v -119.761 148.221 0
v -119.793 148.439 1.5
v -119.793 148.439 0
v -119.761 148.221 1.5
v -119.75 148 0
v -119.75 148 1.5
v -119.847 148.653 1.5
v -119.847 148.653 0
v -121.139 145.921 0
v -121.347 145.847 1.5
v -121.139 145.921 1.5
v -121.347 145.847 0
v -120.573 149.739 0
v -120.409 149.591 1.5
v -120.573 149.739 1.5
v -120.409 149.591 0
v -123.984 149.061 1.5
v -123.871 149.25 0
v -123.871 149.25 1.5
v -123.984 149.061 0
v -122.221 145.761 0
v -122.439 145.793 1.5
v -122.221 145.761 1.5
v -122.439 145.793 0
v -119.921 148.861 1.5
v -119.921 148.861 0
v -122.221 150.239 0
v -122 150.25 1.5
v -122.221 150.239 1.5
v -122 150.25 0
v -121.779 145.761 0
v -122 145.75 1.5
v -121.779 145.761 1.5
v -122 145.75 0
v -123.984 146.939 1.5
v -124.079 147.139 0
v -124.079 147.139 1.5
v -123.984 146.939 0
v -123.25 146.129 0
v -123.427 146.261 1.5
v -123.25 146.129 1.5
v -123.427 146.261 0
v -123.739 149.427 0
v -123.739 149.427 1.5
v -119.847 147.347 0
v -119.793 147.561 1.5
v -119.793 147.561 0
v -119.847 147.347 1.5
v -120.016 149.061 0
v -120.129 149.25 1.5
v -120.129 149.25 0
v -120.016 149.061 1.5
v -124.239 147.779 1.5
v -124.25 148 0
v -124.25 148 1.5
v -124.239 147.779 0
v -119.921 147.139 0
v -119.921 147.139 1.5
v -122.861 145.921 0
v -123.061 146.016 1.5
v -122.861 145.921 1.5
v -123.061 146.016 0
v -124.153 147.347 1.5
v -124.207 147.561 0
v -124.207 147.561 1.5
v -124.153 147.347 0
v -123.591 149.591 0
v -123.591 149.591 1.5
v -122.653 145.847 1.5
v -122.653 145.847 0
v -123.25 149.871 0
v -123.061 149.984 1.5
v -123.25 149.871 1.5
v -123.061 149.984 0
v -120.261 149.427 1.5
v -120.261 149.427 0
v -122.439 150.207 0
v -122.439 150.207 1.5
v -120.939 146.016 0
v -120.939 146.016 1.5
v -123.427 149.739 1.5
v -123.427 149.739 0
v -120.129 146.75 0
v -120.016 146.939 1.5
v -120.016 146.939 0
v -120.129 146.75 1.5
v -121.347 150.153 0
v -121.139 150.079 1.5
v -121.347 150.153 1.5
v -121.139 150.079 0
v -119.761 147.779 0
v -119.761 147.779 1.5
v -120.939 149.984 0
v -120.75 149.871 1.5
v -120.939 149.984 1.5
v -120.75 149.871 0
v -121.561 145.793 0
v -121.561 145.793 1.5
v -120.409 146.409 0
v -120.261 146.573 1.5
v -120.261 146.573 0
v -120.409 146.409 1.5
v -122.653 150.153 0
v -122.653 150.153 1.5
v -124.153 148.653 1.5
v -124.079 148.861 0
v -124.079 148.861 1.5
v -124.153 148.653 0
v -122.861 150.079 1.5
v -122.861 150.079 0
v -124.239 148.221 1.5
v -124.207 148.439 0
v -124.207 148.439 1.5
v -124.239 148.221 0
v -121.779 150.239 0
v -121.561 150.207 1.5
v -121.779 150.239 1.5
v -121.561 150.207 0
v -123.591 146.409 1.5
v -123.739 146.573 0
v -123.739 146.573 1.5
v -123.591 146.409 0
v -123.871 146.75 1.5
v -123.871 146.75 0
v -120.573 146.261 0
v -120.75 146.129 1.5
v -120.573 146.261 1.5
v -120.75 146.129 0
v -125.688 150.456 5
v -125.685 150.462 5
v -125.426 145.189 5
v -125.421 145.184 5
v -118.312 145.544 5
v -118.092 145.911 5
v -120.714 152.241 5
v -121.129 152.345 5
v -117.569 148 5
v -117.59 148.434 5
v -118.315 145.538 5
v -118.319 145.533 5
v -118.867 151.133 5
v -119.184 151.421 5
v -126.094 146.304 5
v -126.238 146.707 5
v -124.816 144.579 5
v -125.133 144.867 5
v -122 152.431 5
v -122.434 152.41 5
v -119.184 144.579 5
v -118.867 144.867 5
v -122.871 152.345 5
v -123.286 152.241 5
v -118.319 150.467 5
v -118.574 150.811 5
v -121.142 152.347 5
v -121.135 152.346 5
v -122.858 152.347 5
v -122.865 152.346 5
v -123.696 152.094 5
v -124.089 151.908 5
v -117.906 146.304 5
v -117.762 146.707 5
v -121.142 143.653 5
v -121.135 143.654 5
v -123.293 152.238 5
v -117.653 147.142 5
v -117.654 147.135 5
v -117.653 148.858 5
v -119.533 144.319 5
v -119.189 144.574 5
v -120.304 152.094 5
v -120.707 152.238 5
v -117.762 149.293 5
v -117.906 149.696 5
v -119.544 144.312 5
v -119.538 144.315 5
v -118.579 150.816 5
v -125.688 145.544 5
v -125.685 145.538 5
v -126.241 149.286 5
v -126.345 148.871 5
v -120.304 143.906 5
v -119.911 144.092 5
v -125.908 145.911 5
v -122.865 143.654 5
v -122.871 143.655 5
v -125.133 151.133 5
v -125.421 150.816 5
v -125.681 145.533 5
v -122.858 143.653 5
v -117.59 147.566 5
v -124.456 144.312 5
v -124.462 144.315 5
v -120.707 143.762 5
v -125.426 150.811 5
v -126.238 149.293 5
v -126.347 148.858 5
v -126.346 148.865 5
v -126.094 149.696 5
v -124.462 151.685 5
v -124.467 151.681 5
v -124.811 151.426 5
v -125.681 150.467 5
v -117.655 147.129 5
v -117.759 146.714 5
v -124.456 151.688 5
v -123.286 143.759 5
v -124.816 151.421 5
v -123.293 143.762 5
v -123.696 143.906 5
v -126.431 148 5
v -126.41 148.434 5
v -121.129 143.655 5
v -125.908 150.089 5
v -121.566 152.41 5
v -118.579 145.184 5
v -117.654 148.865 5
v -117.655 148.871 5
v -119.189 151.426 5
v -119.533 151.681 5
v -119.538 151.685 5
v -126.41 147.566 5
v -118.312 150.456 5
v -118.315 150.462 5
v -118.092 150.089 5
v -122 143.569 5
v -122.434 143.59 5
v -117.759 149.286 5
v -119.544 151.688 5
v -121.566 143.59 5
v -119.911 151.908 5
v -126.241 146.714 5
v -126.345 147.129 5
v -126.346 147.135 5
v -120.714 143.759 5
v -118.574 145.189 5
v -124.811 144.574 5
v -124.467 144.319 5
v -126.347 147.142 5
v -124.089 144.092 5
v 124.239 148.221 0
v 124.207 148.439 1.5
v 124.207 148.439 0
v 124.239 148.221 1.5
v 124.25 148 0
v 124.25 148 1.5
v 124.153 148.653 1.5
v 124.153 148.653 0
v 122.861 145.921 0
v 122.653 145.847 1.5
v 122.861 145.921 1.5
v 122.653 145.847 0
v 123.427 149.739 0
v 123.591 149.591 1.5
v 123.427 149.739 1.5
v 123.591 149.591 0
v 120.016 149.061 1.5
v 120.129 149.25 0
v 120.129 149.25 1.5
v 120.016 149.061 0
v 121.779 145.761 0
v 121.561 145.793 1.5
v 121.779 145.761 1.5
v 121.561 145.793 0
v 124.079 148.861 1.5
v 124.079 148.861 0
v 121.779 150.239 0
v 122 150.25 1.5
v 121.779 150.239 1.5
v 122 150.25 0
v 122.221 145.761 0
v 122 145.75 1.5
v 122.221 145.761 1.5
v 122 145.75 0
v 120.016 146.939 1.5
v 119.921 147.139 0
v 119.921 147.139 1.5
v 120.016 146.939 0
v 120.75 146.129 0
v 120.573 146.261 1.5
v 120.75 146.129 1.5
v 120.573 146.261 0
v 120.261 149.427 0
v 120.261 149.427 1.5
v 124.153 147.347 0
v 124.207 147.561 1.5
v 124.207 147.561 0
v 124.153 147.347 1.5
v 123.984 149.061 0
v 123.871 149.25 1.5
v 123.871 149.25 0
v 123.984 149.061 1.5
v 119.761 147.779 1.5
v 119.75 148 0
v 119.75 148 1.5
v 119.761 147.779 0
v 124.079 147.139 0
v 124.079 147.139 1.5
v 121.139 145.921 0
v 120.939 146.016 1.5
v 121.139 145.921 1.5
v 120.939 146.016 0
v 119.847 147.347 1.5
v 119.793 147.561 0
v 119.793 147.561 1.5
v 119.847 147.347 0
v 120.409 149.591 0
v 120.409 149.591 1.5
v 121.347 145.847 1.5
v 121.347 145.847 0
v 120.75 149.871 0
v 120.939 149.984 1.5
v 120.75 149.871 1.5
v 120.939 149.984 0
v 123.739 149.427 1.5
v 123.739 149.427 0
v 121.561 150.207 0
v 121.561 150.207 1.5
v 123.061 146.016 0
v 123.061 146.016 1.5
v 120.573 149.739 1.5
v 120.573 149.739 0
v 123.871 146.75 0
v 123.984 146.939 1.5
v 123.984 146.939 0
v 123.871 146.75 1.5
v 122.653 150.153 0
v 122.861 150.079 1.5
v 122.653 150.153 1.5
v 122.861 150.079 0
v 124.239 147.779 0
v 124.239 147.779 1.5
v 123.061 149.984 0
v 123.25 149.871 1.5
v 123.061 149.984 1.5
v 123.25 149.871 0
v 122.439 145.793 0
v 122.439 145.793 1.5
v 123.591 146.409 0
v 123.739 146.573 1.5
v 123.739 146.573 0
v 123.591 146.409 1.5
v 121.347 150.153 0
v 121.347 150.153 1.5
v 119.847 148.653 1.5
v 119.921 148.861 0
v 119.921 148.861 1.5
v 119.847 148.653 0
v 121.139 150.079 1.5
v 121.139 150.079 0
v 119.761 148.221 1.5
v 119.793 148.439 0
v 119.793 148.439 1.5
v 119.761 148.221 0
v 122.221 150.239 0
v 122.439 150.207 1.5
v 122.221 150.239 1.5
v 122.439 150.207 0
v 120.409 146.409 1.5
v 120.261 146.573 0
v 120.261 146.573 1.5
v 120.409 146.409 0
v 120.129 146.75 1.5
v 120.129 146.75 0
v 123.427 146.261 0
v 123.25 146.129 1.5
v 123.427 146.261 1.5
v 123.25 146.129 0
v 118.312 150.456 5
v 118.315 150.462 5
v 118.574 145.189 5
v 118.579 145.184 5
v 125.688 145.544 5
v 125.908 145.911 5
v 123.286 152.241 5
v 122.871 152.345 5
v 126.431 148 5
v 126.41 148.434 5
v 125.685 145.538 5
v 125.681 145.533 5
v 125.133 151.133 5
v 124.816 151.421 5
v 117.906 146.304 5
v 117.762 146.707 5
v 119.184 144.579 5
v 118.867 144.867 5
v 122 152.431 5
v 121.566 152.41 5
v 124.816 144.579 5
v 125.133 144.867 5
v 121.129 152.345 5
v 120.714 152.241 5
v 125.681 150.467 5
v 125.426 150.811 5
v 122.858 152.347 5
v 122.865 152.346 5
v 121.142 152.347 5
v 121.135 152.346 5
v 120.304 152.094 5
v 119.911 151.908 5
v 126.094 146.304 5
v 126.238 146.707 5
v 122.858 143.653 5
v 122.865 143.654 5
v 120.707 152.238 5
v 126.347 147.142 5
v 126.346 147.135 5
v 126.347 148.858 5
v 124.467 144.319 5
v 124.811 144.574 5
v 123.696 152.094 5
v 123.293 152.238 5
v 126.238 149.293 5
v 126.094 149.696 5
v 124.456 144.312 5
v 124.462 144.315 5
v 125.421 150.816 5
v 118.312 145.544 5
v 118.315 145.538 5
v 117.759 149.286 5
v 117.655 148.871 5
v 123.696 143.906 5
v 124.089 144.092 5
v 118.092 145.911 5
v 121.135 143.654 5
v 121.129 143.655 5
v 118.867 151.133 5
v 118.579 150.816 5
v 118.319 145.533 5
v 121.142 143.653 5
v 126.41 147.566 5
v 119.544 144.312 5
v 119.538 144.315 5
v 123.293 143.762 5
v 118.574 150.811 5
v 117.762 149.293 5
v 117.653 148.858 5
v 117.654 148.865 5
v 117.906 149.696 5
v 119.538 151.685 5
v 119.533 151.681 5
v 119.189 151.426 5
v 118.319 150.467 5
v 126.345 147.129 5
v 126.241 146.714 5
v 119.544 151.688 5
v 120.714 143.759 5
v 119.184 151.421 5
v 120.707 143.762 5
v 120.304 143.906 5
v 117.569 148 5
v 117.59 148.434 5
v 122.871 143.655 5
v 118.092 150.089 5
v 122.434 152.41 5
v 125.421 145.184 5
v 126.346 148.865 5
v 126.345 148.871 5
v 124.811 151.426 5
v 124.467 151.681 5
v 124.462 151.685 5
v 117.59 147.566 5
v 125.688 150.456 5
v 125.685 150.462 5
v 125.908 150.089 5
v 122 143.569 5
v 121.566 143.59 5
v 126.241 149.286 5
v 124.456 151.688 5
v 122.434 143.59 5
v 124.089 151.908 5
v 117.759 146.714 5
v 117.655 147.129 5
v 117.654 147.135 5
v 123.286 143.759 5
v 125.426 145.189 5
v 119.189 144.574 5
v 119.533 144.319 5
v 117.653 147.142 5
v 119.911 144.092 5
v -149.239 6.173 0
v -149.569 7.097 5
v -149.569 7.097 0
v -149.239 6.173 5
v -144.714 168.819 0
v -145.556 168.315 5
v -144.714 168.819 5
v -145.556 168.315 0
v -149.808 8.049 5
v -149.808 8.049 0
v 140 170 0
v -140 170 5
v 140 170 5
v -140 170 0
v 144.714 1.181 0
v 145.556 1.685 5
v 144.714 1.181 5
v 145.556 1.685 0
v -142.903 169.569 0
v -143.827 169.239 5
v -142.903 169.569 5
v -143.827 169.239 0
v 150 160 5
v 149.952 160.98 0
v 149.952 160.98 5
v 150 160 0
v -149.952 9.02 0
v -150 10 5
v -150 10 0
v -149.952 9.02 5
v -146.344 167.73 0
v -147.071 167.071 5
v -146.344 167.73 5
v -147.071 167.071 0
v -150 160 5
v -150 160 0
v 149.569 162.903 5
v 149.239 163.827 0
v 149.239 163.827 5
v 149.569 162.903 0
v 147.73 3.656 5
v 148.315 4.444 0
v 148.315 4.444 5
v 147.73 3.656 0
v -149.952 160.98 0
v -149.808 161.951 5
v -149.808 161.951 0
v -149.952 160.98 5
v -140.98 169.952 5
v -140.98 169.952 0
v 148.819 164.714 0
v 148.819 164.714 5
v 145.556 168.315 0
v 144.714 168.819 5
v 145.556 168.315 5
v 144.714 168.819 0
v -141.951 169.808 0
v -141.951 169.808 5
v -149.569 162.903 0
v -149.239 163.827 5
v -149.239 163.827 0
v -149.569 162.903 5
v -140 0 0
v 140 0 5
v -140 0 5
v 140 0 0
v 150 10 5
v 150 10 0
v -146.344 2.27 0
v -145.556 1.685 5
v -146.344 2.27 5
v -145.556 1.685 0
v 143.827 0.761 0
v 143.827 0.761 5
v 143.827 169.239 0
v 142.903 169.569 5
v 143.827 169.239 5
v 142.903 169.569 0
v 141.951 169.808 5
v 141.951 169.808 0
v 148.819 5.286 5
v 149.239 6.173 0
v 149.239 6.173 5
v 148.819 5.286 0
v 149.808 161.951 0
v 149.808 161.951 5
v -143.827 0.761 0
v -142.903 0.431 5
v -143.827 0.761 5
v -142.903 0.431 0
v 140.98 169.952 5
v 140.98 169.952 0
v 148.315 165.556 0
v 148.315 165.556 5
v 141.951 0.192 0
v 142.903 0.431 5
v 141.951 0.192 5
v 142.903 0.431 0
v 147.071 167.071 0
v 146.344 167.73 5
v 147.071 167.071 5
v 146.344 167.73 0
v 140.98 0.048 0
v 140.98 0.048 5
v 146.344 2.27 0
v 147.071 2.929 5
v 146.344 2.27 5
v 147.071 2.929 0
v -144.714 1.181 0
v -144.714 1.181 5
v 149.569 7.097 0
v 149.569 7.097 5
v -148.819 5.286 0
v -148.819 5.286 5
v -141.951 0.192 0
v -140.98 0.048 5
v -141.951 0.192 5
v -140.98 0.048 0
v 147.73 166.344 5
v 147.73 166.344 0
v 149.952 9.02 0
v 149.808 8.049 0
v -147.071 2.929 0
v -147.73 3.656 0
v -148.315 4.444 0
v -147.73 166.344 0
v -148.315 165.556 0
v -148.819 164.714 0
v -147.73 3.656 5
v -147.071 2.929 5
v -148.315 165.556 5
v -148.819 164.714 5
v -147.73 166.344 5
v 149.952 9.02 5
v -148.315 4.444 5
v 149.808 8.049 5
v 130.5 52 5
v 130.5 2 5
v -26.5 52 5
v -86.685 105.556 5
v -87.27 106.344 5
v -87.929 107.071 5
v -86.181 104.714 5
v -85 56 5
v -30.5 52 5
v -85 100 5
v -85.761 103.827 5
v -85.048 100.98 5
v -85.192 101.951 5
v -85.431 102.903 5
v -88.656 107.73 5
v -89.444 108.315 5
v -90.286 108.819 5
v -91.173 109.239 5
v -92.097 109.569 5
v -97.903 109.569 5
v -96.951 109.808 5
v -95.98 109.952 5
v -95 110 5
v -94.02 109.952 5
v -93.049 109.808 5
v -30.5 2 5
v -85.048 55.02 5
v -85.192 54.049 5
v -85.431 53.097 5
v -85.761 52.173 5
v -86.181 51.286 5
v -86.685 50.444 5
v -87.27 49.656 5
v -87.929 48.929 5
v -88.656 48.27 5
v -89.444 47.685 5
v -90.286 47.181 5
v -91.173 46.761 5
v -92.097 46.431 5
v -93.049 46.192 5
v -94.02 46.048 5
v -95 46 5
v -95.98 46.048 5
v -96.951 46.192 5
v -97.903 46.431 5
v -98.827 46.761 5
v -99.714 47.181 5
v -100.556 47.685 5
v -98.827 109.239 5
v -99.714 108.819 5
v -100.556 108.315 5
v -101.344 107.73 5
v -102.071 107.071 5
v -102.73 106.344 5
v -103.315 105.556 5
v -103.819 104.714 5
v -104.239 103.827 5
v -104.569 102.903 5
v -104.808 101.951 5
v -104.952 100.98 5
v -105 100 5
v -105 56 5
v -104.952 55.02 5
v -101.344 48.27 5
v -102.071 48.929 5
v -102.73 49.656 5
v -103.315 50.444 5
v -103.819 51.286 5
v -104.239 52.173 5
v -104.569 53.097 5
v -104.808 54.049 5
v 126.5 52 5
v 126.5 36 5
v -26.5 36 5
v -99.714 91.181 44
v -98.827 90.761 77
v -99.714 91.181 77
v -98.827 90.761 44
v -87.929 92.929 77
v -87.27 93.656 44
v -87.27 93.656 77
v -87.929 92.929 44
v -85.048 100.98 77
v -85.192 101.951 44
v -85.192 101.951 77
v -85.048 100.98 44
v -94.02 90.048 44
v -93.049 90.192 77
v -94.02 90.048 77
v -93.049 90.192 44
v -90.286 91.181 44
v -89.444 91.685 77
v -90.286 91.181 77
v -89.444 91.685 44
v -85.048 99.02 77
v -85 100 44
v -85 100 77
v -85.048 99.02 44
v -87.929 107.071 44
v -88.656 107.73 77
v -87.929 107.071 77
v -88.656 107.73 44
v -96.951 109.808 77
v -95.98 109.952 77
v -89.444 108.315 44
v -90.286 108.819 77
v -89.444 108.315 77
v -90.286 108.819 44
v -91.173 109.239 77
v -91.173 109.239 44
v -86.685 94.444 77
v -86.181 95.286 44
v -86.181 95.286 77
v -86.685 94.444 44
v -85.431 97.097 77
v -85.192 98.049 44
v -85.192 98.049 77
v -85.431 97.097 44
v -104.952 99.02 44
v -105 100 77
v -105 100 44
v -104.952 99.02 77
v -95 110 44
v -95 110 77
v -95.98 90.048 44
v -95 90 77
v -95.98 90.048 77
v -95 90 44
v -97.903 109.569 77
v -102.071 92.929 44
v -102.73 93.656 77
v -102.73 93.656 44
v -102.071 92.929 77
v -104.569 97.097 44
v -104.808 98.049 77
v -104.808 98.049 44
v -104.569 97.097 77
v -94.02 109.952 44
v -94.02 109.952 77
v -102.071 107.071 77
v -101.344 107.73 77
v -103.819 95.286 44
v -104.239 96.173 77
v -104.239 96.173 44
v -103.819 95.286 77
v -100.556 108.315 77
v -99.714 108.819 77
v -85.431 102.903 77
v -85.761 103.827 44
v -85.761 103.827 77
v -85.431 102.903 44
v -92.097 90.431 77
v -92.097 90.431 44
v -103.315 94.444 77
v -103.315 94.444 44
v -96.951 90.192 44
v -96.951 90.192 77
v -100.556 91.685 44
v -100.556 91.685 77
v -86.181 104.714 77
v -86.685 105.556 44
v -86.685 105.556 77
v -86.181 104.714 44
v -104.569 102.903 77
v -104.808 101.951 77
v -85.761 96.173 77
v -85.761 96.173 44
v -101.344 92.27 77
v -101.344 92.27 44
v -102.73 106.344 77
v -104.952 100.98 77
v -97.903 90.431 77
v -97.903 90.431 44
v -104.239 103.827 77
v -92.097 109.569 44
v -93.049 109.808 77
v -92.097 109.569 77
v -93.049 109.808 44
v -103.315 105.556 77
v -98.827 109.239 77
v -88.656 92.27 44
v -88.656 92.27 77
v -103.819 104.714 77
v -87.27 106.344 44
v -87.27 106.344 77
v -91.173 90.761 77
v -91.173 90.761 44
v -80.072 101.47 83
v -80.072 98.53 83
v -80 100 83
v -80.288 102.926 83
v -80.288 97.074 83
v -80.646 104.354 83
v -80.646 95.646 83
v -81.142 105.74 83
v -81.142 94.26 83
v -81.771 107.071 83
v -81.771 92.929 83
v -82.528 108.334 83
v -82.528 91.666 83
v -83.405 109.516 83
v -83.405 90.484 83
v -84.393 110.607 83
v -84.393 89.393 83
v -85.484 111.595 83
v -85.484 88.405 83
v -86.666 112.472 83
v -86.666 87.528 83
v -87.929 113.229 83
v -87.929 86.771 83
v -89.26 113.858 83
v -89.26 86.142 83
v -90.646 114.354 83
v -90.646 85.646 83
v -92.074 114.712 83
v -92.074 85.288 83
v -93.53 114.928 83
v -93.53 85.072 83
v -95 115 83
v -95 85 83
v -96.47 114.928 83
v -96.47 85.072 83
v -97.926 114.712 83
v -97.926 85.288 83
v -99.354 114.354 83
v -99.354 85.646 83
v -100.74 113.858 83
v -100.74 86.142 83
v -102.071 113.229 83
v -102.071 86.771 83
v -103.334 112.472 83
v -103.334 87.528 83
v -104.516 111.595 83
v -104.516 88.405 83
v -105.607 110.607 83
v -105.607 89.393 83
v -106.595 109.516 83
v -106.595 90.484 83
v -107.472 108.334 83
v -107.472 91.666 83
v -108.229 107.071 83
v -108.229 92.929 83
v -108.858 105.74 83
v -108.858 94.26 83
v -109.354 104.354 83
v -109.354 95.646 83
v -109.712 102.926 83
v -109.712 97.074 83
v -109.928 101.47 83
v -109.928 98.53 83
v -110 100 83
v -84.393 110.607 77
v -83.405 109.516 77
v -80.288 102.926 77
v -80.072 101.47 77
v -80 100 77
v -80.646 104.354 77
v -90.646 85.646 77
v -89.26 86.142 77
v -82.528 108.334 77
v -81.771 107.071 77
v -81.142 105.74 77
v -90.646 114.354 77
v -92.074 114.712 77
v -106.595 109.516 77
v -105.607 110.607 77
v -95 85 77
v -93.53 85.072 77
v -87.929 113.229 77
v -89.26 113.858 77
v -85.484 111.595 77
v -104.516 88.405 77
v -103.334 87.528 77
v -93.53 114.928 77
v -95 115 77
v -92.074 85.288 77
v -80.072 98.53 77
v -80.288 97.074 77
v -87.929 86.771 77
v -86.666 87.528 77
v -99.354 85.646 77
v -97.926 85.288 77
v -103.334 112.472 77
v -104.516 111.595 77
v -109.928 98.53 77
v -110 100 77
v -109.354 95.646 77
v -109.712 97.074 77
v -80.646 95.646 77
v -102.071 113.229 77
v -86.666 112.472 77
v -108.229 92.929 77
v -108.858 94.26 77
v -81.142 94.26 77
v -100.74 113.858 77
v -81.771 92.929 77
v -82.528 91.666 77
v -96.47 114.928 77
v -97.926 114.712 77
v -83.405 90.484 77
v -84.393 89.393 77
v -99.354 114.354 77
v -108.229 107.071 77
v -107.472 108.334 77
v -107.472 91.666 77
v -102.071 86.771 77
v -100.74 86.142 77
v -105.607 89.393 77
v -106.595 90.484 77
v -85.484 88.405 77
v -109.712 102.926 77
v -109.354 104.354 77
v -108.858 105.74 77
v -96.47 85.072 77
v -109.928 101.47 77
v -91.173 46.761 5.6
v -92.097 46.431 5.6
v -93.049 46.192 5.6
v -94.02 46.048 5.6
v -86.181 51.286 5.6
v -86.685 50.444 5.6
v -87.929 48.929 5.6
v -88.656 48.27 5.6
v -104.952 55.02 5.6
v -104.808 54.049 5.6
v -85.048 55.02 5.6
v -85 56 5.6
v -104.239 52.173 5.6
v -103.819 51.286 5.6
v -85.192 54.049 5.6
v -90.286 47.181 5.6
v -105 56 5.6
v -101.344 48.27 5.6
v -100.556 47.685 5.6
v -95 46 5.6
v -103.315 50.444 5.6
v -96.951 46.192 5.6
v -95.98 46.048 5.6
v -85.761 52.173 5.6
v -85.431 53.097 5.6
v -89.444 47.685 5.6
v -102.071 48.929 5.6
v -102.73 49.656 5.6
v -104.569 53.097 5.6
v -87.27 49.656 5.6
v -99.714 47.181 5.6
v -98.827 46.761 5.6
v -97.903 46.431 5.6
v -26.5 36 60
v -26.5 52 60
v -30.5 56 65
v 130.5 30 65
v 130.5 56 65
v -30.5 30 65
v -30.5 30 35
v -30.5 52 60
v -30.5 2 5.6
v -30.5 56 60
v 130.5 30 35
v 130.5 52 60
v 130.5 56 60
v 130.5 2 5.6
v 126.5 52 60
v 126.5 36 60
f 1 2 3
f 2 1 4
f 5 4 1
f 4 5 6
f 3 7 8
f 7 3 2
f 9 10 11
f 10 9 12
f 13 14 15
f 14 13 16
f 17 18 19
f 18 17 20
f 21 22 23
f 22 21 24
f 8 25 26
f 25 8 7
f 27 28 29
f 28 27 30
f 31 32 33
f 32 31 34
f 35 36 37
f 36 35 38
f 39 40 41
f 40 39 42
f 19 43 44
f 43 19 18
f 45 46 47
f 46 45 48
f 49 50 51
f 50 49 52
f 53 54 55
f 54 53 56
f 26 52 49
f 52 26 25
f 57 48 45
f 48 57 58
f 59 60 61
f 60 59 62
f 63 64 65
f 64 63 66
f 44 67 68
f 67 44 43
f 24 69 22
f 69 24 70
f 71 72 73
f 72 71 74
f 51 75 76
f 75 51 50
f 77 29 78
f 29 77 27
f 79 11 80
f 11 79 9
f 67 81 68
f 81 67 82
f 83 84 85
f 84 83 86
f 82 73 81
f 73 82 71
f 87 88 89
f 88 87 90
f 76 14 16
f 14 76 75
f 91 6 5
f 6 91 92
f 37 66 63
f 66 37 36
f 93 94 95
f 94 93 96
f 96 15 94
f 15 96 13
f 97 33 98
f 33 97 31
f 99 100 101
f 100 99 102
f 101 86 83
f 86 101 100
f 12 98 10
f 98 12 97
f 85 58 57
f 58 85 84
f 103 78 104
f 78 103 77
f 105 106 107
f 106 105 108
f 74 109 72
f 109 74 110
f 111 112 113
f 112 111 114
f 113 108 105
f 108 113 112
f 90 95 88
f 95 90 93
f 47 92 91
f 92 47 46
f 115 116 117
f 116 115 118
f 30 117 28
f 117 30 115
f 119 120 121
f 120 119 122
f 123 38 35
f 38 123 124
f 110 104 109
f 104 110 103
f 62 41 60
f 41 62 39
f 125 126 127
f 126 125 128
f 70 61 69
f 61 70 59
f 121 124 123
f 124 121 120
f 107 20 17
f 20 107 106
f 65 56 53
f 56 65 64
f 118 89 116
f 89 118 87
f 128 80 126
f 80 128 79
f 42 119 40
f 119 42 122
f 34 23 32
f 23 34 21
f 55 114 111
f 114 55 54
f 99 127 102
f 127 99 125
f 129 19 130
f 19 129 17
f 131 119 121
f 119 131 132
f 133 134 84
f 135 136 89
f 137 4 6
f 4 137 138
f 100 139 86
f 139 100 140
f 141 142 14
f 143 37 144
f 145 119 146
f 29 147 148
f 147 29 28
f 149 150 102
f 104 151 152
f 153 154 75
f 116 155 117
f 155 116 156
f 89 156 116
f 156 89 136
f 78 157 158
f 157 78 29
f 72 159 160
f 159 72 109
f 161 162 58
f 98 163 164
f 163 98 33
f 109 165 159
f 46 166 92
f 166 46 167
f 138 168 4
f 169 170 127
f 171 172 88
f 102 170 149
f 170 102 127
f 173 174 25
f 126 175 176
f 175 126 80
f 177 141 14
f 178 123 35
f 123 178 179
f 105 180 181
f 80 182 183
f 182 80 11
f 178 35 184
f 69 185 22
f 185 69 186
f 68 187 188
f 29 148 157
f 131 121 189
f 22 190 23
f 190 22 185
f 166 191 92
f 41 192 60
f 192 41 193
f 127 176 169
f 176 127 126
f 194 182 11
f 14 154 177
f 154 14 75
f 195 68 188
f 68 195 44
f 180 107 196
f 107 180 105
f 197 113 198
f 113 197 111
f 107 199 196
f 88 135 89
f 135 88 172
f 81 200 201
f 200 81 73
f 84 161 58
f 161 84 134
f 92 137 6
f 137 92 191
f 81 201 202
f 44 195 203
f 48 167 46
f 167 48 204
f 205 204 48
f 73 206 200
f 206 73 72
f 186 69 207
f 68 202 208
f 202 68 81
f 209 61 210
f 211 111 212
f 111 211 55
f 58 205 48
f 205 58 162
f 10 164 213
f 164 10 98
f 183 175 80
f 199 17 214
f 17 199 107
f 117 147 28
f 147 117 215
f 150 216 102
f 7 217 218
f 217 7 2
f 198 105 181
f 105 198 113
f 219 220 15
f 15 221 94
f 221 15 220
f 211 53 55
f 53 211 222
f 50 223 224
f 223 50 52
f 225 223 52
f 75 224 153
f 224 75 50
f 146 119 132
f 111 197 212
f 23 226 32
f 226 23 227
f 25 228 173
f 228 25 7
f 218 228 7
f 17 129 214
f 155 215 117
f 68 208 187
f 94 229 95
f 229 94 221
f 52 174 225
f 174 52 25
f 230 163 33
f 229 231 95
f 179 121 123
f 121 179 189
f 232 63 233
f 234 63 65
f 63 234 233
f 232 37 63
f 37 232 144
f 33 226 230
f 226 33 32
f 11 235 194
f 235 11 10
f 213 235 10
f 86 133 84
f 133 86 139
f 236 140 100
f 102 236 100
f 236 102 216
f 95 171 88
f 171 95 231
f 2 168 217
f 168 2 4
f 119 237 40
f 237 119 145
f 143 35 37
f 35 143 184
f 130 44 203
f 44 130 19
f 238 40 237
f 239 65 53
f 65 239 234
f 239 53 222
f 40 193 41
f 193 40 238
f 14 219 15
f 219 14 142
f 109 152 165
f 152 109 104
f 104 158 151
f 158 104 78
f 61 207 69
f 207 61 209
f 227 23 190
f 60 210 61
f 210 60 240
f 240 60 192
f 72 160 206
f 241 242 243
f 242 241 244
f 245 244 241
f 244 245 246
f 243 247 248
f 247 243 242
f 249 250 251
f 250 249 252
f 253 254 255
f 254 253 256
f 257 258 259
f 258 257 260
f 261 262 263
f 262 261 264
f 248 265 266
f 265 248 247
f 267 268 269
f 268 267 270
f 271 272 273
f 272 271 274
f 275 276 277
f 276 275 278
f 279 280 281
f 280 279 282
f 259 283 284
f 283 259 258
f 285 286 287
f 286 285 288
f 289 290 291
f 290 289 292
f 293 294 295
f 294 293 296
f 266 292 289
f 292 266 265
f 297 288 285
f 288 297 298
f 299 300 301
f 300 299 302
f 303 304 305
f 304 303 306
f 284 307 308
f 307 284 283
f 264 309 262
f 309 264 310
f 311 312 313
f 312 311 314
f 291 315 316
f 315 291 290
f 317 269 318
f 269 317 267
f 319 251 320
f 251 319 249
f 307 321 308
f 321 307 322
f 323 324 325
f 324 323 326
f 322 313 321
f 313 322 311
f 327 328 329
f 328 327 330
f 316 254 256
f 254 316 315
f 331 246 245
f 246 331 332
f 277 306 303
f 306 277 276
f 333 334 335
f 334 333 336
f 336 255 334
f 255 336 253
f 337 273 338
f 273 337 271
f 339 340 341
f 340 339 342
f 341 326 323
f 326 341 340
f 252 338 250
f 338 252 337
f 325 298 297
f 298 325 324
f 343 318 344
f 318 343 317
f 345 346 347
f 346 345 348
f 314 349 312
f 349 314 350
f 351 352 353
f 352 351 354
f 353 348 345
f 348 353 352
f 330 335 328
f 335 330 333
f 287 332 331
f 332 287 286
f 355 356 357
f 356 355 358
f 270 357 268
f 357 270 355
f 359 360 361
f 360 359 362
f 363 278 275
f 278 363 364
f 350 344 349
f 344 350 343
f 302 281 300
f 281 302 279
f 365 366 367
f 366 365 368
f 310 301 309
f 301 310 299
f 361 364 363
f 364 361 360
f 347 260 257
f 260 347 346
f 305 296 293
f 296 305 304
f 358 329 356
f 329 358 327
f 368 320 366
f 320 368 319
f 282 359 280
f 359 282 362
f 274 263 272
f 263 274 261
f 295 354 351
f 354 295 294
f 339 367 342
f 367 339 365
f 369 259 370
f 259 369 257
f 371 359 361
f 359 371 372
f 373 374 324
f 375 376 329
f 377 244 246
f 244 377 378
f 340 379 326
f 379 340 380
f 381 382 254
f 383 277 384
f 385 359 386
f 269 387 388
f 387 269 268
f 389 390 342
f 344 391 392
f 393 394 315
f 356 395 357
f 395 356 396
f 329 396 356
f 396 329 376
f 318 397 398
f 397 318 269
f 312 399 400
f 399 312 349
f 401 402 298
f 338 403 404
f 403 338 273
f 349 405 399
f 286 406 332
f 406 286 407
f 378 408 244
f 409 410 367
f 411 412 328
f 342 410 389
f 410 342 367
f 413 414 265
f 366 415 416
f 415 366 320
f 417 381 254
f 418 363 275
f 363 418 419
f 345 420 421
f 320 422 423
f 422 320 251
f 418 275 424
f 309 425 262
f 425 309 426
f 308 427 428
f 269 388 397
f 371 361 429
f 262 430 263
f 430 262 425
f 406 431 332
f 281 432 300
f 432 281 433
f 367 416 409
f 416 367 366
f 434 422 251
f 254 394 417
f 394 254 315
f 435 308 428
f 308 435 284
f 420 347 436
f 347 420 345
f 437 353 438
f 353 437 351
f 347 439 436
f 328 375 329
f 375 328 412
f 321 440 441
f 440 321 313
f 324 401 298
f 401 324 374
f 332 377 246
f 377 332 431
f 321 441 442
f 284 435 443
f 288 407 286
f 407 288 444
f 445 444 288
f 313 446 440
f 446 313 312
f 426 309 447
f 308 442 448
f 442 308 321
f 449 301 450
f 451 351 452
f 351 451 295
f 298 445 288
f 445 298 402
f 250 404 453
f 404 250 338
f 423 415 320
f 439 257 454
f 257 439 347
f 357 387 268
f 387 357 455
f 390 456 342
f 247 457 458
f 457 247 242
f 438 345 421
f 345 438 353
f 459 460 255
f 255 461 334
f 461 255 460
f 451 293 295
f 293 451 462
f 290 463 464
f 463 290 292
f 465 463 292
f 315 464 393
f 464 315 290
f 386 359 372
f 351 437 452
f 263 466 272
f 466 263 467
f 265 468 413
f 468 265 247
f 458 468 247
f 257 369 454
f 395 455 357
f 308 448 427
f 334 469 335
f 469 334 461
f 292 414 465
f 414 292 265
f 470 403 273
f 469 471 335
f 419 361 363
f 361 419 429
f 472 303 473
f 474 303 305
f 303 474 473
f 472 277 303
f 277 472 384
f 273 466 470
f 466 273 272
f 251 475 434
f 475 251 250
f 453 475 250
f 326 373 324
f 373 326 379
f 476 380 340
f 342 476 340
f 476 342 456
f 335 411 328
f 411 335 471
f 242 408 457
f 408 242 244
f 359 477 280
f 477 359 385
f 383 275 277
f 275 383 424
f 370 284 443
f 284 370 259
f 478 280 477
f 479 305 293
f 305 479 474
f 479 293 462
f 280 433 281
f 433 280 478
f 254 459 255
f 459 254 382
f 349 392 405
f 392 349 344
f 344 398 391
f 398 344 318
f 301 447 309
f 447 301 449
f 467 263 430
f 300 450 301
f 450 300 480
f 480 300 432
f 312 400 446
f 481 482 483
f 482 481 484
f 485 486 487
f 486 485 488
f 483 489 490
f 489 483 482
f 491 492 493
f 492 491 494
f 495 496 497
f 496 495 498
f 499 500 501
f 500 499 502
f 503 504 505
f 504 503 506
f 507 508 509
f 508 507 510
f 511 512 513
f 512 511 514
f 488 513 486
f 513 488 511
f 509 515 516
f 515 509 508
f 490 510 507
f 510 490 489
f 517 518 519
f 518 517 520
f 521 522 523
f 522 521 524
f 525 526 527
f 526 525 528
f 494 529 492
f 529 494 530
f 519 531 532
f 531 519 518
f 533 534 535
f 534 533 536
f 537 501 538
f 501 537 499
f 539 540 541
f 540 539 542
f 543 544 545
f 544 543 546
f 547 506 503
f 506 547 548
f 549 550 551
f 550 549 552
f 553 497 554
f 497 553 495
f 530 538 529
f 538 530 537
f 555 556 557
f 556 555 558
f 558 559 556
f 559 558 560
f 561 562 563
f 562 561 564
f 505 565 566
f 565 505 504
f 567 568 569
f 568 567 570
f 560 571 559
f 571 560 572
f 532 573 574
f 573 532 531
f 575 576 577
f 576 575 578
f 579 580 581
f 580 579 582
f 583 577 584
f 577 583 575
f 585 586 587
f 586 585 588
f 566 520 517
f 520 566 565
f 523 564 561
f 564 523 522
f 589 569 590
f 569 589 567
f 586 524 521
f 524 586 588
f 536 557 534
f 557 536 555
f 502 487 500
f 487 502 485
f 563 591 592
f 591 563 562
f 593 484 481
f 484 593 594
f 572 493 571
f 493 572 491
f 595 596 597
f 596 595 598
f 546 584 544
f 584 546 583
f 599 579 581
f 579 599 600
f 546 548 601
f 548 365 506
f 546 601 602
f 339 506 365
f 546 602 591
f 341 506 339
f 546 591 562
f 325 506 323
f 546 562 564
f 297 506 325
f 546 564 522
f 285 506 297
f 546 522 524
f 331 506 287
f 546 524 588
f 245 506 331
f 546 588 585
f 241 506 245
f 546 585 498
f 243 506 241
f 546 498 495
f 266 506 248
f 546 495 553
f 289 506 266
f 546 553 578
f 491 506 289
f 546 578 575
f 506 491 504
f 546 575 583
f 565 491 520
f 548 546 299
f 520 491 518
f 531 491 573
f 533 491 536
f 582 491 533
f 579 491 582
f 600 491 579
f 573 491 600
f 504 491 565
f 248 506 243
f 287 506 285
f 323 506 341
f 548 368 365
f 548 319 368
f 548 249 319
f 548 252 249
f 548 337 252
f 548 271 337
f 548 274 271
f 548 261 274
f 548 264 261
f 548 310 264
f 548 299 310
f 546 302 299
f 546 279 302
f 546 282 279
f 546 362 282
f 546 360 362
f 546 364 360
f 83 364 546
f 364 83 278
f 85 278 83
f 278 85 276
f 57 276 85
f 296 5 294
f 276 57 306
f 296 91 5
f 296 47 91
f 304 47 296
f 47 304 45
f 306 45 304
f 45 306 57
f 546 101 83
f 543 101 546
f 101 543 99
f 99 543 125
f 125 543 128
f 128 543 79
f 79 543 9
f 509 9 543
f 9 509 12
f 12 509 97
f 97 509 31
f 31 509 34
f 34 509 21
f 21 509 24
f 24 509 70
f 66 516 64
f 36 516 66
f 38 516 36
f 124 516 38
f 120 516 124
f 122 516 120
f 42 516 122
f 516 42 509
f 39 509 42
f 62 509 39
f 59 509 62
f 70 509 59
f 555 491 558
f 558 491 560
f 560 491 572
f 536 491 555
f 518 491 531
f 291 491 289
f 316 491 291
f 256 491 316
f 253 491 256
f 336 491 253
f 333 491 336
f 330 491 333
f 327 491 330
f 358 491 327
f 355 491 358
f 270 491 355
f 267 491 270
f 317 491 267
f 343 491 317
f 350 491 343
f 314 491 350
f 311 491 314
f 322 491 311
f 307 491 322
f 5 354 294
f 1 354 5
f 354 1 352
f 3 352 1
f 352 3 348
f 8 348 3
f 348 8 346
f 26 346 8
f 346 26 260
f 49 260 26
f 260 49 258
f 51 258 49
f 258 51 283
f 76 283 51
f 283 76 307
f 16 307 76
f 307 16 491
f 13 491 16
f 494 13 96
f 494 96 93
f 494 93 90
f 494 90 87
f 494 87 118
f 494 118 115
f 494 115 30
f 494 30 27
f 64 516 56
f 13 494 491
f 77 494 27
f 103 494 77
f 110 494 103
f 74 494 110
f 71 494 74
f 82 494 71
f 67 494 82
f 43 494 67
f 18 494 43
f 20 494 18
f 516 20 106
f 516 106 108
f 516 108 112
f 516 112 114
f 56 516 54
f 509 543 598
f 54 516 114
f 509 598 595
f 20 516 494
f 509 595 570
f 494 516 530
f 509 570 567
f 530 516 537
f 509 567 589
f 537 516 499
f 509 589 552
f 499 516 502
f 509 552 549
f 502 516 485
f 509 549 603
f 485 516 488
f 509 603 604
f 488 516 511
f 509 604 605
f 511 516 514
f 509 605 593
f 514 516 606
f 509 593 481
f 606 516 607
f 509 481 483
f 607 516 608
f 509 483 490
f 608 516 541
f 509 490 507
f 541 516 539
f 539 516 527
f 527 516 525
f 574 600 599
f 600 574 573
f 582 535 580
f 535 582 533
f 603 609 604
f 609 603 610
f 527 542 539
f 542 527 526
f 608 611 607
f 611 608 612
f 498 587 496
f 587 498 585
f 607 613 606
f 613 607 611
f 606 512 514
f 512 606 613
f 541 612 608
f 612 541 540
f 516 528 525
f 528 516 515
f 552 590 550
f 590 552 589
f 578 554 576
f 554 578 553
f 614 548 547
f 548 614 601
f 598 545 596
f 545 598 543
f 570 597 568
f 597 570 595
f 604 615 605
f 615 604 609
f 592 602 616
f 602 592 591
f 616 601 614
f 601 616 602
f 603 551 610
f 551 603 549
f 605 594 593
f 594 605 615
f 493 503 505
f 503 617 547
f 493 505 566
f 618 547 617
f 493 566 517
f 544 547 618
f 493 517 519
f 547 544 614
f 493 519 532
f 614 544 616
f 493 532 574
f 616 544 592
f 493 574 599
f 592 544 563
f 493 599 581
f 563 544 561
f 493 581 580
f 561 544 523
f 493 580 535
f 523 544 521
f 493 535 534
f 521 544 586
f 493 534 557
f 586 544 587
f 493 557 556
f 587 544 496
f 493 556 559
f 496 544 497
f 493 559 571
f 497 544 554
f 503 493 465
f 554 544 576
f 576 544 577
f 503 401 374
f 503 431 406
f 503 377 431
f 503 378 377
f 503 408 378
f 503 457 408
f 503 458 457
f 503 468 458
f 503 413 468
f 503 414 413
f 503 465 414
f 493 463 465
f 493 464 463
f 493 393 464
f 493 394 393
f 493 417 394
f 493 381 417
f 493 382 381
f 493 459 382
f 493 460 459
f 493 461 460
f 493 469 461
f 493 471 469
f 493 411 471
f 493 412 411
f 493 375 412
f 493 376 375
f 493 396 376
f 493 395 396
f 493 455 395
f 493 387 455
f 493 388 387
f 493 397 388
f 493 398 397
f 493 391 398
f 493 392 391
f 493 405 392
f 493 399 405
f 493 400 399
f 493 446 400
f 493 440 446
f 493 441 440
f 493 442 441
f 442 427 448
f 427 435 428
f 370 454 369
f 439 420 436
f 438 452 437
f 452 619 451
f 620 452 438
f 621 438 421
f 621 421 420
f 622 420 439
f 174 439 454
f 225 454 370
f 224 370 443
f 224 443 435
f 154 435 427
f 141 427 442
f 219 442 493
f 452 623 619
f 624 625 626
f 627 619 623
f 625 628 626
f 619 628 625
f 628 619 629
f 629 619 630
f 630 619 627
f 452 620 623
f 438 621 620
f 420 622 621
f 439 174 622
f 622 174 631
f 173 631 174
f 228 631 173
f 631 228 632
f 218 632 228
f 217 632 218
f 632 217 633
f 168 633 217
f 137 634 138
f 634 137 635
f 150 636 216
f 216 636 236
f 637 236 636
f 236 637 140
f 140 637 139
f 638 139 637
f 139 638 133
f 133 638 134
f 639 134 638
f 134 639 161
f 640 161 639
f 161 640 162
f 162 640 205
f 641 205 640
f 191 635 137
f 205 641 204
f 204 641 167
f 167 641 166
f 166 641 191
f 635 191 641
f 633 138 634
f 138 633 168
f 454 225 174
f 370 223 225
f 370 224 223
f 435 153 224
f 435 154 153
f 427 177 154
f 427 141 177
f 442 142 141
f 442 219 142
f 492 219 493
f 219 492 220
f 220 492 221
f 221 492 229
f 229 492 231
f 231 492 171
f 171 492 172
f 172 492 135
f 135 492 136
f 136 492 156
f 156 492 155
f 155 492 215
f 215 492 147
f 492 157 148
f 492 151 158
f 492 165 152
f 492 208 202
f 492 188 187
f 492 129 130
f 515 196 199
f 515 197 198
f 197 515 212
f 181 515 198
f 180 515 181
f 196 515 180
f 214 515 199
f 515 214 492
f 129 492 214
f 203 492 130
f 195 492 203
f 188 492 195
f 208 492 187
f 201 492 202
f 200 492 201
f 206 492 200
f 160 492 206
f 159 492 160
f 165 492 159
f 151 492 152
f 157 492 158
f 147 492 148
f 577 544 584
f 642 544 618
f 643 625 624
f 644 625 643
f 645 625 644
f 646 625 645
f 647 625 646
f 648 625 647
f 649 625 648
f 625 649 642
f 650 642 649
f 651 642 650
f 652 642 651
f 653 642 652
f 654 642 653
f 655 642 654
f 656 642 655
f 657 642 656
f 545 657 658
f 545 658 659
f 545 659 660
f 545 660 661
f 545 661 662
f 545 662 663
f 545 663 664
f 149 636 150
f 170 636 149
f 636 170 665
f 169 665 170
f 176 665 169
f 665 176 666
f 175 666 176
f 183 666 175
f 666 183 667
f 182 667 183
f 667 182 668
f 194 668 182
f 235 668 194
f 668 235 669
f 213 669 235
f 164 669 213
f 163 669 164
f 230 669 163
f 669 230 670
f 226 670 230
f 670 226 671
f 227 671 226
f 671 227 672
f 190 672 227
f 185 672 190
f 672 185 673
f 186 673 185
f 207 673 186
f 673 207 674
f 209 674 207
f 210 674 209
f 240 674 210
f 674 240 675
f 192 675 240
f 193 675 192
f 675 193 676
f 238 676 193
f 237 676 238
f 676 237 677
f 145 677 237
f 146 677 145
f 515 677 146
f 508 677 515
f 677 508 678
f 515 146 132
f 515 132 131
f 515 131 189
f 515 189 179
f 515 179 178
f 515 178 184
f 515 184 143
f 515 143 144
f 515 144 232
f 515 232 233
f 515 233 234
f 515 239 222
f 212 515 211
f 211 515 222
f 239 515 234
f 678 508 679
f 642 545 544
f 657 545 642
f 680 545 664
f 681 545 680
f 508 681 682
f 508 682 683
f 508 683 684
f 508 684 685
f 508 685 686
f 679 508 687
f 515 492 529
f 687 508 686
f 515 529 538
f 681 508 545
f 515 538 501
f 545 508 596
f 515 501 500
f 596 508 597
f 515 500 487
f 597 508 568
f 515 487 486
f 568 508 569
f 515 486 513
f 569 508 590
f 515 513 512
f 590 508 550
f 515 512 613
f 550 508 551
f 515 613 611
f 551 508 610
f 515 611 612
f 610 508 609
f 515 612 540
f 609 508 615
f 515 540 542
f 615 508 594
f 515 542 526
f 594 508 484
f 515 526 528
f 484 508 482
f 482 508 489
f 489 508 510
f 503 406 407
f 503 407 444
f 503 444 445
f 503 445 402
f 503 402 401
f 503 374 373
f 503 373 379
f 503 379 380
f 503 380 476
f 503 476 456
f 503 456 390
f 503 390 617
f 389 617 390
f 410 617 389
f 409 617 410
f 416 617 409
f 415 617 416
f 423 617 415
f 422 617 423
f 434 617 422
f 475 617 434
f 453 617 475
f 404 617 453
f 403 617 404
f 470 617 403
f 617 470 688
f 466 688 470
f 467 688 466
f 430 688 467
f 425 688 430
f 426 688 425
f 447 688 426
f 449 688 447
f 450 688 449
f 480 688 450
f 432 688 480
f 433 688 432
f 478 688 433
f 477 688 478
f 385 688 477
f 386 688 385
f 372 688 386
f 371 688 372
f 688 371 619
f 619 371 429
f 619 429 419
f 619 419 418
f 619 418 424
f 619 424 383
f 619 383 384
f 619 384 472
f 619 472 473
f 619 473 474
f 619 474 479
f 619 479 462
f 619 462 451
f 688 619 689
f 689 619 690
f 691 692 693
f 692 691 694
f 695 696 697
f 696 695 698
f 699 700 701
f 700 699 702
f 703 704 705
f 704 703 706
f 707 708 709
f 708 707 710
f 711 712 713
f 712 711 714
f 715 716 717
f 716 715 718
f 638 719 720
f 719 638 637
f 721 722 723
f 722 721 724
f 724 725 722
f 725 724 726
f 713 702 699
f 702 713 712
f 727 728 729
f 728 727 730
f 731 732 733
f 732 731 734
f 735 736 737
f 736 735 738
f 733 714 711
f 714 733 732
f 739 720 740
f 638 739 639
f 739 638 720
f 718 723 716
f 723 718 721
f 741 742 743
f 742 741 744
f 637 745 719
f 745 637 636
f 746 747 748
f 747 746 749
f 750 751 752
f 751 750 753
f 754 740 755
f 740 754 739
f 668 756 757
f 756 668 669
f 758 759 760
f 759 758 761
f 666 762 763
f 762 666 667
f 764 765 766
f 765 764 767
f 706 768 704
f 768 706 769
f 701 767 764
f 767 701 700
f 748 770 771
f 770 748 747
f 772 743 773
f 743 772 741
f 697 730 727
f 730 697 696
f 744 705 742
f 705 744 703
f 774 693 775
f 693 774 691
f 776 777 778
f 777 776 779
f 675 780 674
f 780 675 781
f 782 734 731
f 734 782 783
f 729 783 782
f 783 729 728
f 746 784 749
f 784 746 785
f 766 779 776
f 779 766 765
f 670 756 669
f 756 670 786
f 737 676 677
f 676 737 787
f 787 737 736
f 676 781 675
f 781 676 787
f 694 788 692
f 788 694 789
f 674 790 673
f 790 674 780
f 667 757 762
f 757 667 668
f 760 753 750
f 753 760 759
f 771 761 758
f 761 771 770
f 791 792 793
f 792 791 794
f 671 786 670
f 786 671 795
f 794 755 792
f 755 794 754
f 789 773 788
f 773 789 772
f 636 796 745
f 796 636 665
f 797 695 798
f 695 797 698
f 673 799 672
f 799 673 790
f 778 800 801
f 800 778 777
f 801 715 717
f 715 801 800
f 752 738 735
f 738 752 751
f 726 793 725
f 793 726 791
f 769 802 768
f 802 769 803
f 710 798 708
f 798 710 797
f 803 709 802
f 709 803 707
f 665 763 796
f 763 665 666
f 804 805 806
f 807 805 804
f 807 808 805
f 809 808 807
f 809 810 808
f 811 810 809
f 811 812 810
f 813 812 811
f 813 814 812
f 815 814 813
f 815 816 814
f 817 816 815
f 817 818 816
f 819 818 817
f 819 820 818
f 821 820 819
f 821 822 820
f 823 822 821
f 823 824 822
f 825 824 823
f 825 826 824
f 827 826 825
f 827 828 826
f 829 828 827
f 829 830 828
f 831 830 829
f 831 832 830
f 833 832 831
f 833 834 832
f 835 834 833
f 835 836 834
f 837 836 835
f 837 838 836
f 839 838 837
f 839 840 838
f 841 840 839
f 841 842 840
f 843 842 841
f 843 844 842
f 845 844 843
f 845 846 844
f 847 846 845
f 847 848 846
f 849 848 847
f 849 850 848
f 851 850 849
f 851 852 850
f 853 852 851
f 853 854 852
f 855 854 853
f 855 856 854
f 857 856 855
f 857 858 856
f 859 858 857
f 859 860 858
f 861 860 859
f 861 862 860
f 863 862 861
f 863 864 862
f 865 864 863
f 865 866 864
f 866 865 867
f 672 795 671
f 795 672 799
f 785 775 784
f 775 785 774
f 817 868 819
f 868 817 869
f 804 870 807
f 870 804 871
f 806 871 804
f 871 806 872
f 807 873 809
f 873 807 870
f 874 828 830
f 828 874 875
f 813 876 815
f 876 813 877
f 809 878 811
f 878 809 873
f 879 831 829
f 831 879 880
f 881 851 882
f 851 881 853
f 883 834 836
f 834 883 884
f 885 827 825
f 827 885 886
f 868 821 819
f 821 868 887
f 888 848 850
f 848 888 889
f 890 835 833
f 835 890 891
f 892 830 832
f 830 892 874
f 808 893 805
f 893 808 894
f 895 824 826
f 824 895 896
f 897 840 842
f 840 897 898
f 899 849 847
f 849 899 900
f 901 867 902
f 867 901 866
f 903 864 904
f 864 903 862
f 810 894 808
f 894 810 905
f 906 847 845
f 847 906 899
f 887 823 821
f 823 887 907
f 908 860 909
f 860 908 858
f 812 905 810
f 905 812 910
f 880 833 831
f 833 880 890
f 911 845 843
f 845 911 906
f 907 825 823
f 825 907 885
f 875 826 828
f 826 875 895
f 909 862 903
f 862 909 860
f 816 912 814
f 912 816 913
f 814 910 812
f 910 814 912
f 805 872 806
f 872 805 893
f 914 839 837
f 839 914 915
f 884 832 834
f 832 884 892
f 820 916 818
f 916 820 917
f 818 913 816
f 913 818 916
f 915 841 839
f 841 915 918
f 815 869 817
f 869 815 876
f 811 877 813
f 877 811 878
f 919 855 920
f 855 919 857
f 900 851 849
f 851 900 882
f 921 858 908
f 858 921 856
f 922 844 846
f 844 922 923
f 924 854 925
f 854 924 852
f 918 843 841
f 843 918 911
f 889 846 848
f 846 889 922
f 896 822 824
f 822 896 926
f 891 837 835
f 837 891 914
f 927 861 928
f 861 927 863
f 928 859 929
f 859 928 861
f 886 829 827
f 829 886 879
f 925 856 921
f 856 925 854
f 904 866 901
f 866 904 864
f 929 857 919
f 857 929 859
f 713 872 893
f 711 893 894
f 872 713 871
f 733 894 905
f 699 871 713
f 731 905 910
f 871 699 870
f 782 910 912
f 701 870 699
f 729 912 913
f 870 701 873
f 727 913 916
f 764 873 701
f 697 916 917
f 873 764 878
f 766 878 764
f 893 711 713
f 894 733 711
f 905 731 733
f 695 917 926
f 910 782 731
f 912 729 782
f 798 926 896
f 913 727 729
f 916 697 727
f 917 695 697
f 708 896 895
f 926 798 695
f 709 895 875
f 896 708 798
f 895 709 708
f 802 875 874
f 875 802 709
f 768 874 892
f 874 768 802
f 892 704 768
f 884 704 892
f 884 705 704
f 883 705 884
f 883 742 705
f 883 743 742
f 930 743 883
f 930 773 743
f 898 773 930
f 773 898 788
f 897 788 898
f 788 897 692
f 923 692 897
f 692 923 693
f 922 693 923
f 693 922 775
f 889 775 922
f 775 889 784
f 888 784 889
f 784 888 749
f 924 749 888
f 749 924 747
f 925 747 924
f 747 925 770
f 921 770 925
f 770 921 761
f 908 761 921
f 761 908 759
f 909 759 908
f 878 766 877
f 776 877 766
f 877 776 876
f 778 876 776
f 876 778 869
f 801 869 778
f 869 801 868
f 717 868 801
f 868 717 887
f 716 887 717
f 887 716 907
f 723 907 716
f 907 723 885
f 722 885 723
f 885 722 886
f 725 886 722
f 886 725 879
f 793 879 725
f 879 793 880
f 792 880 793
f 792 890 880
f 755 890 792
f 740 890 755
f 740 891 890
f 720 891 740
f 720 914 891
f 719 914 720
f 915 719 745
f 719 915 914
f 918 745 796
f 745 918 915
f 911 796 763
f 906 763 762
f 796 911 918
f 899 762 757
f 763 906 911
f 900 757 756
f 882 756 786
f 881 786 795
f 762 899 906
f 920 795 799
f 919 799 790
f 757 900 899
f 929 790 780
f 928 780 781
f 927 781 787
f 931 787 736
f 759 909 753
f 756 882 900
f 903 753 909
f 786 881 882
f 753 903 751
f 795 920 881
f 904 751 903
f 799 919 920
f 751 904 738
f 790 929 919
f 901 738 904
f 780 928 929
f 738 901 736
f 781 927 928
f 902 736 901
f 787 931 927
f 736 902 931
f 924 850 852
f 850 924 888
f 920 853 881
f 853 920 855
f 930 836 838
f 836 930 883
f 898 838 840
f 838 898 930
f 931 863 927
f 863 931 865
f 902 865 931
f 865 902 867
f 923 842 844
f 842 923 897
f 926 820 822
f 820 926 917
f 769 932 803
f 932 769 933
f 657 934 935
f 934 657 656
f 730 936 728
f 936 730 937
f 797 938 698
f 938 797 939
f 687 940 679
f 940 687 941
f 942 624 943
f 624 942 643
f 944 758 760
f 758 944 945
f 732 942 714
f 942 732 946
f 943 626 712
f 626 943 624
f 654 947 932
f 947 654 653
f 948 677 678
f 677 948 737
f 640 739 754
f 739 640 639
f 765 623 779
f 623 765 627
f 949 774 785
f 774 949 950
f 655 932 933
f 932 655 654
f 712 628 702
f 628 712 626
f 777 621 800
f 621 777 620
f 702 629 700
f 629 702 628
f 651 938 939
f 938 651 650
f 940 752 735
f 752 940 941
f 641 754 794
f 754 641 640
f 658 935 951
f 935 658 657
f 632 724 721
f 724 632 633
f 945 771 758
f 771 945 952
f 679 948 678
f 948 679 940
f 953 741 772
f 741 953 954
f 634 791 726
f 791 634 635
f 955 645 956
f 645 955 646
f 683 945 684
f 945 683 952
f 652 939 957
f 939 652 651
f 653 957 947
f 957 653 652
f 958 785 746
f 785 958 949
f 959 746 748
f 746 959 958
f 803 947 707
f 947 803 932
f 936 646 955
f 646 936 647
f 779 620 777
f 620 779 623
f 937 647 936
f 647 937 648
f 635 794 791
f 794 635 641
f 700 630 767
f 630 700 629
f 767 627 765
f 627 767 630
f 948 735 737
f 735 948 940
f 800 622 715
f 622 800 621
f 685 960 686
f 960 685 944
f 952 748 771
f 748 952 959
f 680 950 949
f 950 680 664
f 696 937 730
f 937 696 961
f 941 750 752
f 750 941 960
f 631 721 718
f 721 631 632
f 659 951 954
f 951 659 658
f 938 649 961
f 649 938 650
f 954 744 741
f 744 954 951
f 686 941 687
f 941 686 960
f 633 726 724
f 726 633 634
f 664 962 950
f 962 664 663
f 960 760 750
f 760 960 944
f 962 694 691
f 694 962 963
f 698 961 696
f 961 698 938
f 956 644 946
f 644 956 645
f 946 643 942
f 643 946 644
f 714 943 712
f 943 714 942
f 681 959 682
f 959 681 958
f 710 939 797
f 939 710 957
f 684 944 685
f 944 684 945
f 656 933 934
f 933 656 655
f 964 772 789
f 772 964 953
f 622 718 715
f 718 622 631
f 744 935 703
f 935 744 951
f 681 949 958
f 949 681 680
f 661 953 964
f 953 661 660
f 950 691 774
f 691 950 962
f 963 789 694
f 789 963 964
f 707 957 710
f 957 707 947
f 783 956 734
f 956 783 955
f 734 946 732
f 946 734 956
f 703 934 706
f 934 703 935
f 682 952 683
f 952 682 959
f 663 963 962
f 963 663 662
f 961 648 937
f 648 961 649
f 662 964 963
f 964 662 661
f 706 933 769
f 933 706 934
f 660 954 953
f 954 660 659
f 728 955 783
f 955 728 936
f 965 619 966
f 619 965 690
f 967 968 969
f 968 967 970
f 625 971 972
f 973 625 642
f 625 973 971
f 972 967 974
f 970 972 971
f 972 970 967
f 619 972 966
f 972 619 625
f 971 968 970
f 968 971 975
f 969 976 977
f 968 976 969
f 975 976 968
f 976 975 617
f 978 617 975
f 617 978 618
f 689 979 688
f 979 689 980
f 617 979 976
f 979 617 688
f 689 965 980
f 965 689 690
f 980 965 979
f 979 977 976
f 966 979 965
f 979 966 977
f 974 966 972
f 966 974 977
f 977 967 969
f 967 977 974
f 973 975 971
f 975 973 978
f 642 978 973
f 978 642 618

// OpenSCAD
// wall_mount.scad — Xbox Elite Series 2 controller + Logitech G733 headset wall mount
// Layout: SIDE-BY-SIDE — headset hook (left) + controller cradle (right), 2 drywall anchors.
// Convention: X = width, Y = up the wall, Z = out from the wall (Z=0 is the wall face).
//
// !! Linear device dims are PROXIES. dimensions.com Xbox One pad = 153 x 102 x 61 mm
//    (best proxy; no Elite 2 / Series X|S / G733 page). Weights: controller ~345 g,
//    headset ~285 g loaded. Caliper-verify *_fit params before the final print.

/* [Backplate] */
plate_w  = 300;   // overall width (landscape) — K2 Plus bed is 350
plate_h  = 170;   // overall height
plate_t  = 5;     // thickness (wall face -> front face)
corner_r = 10;    // rounded corner radius

/* [Mounting - drywall anchors] */
screw_inset_x = 28;   // anchor distance in from each side edge
screw_top_off = 22;   // anchor distance below the top edge
screw_shank_d = 4.5;  // shank clearance hole
screw_head_d  = 9;    // countersink head diameter (#6-#8 flat head)
screw_head_h  = 3.5;  // countersink depth

/* [Headset hook - LEFT] G733, thin fabric strap */
hook_x        = -95;  // peg centre X
hook_y        = 100;  // peg centre height up the wall
hook_out      = 78;   // peg projection from wall (clear the earcups)
hook_dia      = 20;   // peg diameter (band rests on top)
hook_endcap   = 30;   // end-stop disc diameter (keeps the band on)
hook_endcap_t = 6;    // end-stop thickness
hook_gusset   = 44;   // brace drop below the peg

/* [Controller cradle - RIGHT] Elite Series 2 */
ctrl_w_fit    = 155;  // controller width (dimensions.com Xbox One 153; +2 for Elite grips - verify)
cradle_cx     = 50;   // cradle centre X
cradle_y      = 30;   // shelf height up the wall
cradle_clear  = 6;    // width clearance added to controller width
cradle_out    = 60;   // tray projection from the wall
cradle_t      = 6;    // tray floor thickness
lip_h         = 26;   // front retaining lip height
lip_t         = 5;    // front lip thickness
side_h        = 22;   // side guide height
side_t        = 4;    // side guide thickness
cradle_gusset = 28;   // brace drop below the tray

$fn = 64;

module rrect(w, h, r) {
  hull() for (sx=[-1,1], sy=[-1,1])
    translate([sx*(w/2 - r), sy*(h/2 - r)]) circle(r=r);
}

module screw_hole() {
  // shank through the plate + countersink opening at the FRONT (Z = plate_t)
  translate([0,0,-0.1]) cylinder(d=screw_shank_d, h=plate_t + 0.2);
  translate([0,0, plate_t - screw_head_h])
    cylinder(d1=screw_shank_d, d2=screw_head_d, h=screw_head_h + 0.11);
}

module backplate() {
  difference() {
    linear_extrude(plate_t)
      translate([0, plate_h/2]) rrect(plate_w, plate_h, corner_r);
    for (sx=[-1,1])
      translate([sx*(plate_w/2 - screw_inset_x), plate_h - screw_top_off, 0]) screw_hole();
  }
}

module headset_hook() {
  // peg + end stop
  translate([hook_x, hook_y, plate_t]) {
    cylinder(d=hook_dia, h=hook_out);
    translate([0,0, hook_out - hook_endcap_t]) cylinder(d=hook_endcap, h=hook_endcap_t);
  }
  // gusset: hull from the inner half of the peg down to a point lower on the plate
  hull() {
    translate([hook_x, hook_y, plate_t]) cylinder(d=hook_dia, h=hook_out*0.5);
    translate([hook_x, hook_y - hook_gusset, plate_t]) cylinder(d=hook_dia, h=0.6);
  }
}

module cradle() {
  cw = ctrl_w_fit + cradle_clear;     // tray width
  translate([cradle_cx, 0, 0]) {
    // tray floor
    translate([-cw/2, cradle_y, plate_t]) cube([cw, cradle_t, cradle_out]);
    // front retaining lip
    translate([-cw/2, cradle_y, plate_t + cradle_out - lip_t]) cube([cw, lip_h, lip_t]);
    // side guides
    for (sx=[-1,1])
      translate([sx < 0 ? -cw/2 : cw/2 - side_t, cradle_y, plate_t])
        cube([side_t, side_h, cradle_out]);
    // gusset: hull from under the tray down to a point lower on the plate
    hull() {
      translate([-cw/2, cradle_y, plate_t]) cube([cw, 0.6, cradle_out*0.5]);
      translate([-cw/2, cradle_y - cradle_gusset, plate_t]) cube([cw, 0.6, 0.6]);
    }
  }
}

backplate();
headset_hook();
cradle();
